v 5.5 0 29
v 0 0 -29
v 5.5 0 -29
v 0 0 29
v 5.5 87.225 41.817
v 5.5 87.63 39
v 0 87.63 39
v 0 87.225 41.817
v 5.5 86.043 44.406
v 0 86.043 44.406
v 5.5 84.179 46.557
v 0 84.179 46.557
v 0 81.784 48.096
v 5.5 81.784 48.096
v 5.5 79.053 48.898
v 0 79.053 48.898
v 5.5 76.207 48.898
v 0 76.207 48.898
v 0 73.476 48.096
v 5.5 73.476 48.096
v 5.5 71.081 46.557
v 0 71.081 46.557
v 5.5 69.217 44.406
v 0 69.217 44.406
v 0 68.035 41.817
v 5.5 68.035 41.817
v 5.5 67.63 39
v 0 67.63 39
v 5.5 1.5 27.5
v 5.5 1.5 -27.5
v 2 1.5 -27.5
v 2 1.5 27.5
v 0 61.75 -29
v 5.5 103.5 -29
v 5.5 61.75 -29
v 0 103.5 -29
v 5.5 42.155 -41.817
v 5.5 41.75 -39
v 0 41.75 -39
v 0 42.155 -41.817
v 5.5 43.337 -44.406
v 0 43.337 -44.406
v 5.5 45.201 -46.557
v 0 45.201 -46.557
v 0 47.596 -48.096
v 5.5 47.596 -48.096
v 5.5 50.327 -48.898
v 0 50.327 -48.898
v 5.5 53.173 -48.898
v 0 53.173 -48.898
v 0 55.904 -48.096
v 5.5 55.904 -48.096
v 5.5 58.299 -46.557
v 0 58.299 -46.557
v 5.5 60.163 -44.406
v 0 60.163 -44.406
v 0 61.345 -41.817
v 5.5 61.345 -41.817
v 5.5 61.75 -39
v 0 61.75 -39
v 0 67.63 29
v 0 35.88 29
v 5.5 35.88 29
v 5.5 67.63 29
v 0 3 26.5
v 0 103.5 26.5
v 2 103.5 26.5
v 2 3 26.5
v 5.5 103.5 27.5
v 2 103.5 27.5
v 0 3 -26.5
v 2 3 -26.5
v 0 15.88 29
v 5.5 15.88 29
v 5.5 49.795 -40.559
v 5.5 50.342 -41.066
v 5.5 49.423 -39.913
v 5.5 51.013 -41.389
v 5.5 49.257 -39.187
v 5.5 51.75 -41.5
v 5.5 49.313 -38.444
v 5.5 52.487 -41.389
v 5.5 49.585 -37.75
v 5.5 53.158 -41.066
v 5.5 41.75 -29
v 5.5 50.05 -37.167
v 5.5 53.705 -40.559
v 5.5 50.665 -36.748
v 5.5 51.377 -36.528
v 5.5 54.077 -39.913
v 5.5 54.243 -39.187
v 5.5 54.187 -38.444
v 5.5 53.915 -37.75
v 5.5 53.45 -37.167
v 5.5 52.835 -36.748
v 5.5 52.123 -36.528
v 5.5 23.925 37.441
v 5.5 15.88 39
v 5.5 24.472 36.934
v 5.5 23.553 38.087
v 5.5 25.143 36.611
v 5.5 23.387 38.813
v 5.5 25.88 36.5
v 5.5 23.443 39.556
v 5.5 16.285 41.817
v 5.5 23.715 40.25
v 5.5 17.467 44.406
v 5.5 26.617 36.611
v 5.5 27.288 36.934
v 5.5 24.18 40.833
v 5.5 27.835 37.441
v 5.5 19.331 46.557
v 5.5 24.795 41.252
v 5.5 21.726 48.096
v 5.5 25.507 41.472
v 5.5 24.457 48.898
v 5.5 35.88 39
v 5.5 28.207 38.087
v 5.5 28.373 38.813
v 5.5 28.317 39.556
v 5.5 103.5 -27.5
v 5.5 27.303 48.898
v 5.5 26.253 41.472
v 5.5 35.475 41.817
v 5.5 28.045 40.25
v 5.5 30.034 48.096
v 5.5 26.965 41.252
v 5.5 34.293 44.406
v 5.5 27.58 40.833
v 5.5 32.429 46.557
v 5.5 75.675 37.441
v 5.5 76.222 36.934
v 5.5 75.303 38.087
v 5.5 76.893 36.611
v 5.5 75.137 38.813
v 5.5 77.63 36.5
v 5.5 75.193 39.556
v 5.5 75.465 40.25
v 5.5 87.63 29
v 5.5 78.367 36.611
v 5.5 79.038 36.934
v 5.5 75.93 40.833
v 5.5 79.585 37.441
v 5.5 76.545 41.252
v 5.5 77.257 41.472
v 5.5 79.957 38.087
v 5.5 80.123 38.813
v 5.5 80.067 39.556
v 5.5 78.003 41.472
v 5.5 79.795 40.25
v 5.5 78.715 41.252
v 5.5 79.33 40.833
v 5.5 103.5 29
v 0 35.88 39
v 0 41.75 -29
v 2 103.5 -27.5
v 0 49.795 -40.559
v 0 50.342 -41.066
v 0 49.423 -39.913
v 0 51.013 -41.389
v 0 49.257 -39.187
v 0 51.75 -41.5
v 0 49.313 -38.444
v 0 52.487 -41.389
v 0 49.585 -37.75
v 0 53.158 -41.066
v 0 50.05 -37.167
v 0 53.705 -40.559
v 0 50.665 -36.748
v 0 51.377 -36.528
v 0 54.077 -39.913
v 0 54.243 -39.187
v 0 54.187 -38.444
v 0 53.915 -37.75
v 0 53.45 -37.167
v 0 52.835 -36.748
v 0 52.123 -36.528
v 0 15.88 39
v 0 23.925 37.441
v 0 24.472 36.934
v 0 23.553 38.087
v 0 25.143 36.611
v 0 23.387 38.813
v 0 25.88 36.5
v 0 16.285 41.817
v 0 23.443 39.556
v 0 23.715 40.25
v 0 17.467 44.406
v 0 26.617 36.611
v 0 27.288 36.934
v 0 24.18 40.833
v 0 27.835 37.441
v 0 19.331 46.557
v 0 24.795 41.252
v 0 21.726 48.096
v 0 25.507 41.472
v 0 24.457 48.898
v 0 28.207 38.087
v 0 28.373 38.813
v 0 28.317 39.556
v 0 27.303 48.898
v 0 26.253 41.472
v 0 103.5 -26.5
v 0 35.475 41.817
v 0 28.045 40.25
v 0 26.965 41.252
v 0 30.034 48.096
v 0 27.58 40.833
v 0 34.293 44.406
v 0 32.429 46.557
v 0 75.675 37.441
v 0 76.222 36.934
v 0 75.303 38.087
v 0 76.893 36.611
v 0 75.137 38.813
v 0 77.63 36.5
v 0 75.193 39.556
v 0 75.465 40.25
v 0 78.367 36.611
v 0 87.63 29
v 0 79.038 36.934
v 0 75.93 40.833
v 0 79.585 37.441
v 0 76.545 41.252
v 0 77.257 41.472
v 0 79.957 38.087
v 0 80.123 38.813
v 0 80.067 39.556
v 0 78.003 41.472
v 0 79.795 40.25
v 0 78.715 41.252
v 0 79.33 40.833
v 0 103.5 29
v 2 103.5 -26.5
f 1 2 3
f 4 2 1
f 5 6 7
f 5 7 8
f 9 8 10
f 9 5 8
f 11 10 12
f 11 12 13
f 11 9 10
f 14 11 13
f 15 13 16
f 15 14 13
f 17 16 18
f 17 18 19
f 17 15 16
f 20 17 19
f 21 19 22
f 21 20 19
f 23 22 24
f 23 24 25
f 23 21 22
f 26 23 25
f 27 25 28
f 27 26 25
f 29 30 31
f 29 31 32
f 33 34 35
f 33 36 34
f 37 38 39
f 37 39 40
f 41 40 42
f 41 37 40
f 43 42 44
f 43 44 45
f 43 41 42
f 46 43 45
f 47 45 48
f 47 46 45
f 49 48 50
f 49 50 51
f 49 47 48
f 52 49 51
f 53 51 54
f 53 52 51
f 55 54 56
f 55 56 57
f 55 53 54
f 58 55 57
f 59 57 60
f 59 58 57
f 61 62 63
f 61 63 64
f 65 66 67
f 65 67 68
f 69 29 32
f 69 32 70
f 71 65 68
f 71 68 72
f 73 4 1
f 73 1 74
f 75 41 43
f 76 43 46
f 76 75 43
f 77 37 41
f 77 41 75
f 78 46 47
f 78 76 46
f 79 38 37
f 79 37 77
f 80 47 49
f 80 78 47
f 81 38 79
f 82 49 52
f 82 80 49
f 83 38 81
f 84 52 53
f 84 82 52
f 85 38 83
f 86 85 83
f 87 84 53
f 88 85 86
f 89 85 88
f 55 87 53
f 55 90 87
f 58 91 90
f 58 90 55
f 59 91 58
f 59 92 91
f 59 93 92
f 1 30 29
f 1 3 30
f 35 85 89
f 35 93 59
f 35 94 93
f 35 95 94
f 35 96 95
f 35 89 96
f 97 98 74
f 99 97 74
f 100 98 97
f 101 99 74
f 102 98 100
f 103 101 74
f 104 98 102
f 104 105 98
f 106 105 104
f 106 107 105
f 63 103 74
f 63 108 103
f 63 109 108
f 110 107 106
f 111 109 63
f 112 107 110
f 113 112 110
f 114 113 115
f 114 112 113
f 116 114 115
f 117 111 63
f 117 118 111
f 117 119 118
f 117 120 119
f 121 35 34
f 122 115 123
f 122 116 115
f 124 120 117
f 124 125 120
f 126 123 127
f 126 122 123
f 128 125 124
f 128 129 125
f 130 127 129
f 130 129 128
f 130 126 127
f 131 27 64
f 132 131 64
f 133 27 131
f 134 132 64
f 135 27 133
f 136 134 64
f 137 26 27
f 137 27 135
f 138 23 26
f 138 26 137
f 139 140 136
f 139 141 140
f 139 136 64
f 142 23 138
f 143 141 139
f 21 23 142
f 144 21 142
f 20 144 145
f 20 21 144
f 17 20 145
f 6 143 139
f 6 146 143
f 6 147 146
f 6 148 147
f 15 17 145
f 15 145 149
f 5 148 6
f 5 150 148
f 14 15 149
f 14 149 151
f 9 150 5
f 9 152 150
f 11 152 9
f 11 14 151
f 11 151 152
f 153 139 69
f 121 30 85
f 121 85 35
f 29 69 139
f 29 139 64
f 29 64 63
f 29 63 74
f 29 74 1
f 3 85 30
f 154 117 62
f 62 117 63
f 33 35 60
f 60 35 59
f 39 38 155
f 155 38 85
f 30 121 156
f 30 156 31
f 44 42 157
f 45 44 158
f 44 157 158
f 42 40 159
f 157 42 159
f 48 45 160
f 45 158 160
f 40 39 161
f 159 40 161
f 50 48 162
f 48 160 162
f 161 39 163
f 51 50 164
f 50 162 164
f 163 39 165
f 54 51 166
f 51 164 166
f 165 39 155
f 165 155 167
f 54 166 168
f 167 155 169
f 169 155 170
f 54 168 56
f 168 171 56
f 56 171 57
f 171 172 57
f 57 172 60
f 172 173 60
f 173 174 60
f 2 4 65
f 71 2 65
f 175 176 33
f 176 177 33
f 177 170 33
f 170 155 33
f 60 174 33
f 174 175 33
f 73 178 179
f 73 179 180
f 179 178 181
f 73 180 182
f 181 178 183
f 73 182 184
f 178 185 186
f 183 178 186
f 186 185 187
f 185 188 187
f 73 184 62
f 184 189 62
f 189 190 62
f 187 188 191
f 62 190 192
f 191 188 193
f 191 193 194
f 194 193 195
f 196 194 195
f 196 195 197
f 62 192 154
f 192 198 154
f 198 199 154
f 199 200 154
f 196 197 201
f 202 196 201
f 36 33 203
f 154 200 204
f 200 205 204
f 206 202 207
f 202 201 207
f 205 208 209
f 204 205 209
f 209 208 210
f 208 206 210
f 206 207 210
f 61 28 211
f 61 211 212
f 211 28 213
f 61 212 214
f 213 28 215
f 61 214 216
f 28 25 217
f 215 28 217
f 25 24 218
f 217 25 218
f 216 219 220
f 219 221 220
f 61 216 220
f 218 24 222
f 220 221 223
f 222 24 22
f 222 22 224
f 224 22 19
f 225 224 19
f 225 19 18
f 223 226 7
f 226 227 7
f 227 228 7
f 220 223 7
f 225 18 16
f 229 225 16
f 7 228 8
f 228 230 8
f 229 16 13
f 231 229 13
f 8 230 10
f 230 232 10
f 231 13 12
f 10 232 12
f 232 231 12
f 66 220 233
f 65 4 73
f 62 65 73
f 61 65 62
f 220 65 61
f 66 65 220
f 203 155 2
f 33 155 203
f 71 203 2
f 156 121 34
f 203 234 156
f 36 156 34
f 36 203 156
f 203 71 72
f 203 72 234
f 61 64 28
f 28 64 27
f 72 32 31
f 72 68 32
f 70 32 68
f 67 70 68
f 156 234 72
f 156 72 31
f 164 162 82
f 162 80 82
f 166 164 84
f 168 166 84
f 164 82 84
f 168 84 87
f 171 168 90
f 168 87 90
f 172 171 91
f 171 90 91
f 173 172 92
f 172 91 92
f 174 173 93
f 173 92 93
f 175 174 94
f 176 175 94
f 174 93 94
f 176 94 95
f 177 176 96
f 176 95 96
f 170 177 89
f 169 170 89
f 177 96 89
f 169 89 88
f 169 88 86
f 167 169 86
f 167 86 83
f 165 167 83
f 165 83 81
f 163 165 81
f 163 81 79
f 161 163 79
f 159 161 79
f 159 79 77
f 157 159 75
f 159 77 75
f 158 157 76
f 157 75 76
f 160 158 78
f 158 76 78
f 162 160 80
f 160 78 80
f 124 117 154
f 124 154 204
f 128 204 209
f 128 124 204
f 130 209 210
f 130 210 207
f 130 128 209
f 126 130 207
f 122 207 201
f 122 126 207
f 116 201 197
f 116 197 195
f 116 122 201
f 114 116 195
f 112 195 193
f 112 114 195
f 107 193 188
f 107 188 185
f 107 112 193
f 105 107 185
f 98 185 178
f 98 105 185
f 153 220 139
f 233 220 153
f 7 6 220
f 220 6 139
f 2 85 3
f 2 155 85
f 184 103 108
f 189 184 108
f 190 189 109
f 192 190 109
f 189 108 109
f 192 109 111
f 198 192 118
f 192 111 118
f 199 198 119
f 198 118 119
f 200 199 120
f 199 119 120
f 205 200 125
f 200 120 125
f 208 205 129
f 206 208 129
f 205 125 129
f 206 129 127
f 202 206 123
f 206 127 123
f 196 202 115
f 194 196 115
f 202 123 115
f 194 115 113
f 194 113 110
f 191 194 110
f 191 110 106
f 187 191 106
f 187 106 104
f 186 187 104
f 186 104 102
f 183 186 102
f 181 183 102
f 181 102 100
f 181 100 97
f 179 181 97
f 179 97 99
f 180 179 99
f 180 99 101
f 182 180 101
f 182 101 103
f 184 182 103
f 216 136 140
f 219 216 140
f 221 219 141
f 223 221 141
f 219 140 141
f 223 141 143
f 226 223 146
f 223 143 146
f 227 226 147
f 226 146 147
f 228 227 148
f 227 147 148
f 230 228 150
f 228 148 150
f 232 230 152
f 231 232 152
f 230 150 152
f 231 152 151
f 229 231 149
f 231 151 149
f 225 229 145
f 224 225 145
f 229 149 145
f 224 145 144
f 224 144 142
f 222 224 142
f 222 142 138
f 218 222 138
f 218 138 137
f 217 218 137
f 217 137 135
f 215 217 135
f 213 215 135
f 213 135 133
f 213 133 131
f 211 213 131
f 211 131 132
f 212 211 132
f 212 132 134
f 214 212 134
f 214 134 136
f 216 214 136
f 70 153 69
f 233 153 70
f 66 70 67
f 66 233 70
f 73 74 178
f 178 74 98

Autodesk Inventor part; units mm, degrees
ref_plane "YZ Plane" through (0, 0, 0) normal (1, 0, 0) x (0, 1, 0)
ref_plane "XZ Plane" through (0, 0, 0) normal (0, 1, 0) x (-1, 0, 0)
ref_plane "XY Plane" through (0, 0, 0) normal (0, 0, 1) x (1, 0, 0)
sketch "Sketch1" plane through (0, 0, 0) normal (1, 0, 0) x (0, 1, 0)
  line L0 (0, 29) -> (103.5, 29)
  line L1 (103.5, -29) -> (0, -29)
  line L2 (0, -29) -> (0, 29)
  line L3 (103.5, 29) -> (103.5, 26.5)
  line L4 (103.5, 26.5) -> (3, 26.5)
  line L5 (3, 26.5) -> (3, -26.5)
  line L6 (3, -26.5) -> (103.5, -26.5)
  line L7 (103.5, -26.5) -> (103.5, -29)
  point P0 (0, 0)
  point P1 (0, 0)
  dimension "d0" = 103.5
  dimension "d1" = 58
  dimension "d2" = 2.5
  dimension "d3" = 2.5
  dimension "d4" = 3
extrude "Extrusion1" add sketch "Sketch1" along normal blind 5.5
sketch "Sketch2" plane through (5.5, 0, 0) normal (1, 0, 0) x (0, 0, -1)
  circle A0 centre (39, 51.75) radius 2.5
  circle A1 centre (-39, 77.63) radius 2.5
  circle A2 centre (-39, 25.88) radius 2.5
  arc A3 (39, 41.75) -> (39, 61.75) centre (39, 51.75) ccw
  arc A4 (-39, 87.63) -> (-39, 67.63) centre (-39, 77.63) ccw
  arc A5 (-39, 35.88) -> (-39, 15.88) centre (-39, 25.88) ccw
  line L0 (-39, 87.63) -> (-29, 87.63)
  line L1 (-29, 87.63) -> (-29, 67.63)
  line L2 (-29, 67.63) -> (-39, 67.63)
  line L3 (-39, 35.88) -> (-29, 35.88)
  line L4 (-29, 35.88) -> (-29, 15.88)
  line L5 (-29, 15.88) -> (-39, 15.88)
  line L6 (39, 41.75) -> (29, 41.75)
  line L7 (29, 41.75) -> (29, 61.75)
  line L8 (29, 61.75) -> (39, 61.75)
  point P0 (0, 0)
  point P1 (-29, 0)
  point P2 (29, 0)
  dimension "d9" = 5
  dimension "d10" = 10
  dimension "d11" = 10
  dimension "d12" = 41.75
  dimension "d13" = 15.88
  dimension "d14" = 51.75
extrude "Extrusion2" add sketch "Sketch2" against normal blind 5.5
sketch "Sketch3" plane through (5.5, 0, 0) normal (1, 0, 0) x (0, 0, -1)
  line L0 (-27.5, 103.5) -> (27.5, 103.5)
  line L1 (27.5, 103.5) -> (27.5, 1.5)
  line L2 (27.5, 1.5) -> (-27.5, 1.5)
  line L3 (-27.5, 1.5) -> (-27.5, 103.5)
  line L4 (-26.5, 3) -> (-26.5, 103.5) projected
  line L5 (26.5, 103.5) -> (26.5, 3) projected
  line L6 (26.5, 3) -> (-26.5, 3) projected
  point P0 (0, 0)
  point P1 (-29, 103.5)
  dimension "d17" = 1
  dimension "d18" = 1
  dimension "d19" = 1.5
extrude "Extrusion3" cut sketch "Sketch3" against normal blind 3.5
equation "\"d3\" = d2"
equation "\"d18\" = d17"
properties material "ABS Plastic"
